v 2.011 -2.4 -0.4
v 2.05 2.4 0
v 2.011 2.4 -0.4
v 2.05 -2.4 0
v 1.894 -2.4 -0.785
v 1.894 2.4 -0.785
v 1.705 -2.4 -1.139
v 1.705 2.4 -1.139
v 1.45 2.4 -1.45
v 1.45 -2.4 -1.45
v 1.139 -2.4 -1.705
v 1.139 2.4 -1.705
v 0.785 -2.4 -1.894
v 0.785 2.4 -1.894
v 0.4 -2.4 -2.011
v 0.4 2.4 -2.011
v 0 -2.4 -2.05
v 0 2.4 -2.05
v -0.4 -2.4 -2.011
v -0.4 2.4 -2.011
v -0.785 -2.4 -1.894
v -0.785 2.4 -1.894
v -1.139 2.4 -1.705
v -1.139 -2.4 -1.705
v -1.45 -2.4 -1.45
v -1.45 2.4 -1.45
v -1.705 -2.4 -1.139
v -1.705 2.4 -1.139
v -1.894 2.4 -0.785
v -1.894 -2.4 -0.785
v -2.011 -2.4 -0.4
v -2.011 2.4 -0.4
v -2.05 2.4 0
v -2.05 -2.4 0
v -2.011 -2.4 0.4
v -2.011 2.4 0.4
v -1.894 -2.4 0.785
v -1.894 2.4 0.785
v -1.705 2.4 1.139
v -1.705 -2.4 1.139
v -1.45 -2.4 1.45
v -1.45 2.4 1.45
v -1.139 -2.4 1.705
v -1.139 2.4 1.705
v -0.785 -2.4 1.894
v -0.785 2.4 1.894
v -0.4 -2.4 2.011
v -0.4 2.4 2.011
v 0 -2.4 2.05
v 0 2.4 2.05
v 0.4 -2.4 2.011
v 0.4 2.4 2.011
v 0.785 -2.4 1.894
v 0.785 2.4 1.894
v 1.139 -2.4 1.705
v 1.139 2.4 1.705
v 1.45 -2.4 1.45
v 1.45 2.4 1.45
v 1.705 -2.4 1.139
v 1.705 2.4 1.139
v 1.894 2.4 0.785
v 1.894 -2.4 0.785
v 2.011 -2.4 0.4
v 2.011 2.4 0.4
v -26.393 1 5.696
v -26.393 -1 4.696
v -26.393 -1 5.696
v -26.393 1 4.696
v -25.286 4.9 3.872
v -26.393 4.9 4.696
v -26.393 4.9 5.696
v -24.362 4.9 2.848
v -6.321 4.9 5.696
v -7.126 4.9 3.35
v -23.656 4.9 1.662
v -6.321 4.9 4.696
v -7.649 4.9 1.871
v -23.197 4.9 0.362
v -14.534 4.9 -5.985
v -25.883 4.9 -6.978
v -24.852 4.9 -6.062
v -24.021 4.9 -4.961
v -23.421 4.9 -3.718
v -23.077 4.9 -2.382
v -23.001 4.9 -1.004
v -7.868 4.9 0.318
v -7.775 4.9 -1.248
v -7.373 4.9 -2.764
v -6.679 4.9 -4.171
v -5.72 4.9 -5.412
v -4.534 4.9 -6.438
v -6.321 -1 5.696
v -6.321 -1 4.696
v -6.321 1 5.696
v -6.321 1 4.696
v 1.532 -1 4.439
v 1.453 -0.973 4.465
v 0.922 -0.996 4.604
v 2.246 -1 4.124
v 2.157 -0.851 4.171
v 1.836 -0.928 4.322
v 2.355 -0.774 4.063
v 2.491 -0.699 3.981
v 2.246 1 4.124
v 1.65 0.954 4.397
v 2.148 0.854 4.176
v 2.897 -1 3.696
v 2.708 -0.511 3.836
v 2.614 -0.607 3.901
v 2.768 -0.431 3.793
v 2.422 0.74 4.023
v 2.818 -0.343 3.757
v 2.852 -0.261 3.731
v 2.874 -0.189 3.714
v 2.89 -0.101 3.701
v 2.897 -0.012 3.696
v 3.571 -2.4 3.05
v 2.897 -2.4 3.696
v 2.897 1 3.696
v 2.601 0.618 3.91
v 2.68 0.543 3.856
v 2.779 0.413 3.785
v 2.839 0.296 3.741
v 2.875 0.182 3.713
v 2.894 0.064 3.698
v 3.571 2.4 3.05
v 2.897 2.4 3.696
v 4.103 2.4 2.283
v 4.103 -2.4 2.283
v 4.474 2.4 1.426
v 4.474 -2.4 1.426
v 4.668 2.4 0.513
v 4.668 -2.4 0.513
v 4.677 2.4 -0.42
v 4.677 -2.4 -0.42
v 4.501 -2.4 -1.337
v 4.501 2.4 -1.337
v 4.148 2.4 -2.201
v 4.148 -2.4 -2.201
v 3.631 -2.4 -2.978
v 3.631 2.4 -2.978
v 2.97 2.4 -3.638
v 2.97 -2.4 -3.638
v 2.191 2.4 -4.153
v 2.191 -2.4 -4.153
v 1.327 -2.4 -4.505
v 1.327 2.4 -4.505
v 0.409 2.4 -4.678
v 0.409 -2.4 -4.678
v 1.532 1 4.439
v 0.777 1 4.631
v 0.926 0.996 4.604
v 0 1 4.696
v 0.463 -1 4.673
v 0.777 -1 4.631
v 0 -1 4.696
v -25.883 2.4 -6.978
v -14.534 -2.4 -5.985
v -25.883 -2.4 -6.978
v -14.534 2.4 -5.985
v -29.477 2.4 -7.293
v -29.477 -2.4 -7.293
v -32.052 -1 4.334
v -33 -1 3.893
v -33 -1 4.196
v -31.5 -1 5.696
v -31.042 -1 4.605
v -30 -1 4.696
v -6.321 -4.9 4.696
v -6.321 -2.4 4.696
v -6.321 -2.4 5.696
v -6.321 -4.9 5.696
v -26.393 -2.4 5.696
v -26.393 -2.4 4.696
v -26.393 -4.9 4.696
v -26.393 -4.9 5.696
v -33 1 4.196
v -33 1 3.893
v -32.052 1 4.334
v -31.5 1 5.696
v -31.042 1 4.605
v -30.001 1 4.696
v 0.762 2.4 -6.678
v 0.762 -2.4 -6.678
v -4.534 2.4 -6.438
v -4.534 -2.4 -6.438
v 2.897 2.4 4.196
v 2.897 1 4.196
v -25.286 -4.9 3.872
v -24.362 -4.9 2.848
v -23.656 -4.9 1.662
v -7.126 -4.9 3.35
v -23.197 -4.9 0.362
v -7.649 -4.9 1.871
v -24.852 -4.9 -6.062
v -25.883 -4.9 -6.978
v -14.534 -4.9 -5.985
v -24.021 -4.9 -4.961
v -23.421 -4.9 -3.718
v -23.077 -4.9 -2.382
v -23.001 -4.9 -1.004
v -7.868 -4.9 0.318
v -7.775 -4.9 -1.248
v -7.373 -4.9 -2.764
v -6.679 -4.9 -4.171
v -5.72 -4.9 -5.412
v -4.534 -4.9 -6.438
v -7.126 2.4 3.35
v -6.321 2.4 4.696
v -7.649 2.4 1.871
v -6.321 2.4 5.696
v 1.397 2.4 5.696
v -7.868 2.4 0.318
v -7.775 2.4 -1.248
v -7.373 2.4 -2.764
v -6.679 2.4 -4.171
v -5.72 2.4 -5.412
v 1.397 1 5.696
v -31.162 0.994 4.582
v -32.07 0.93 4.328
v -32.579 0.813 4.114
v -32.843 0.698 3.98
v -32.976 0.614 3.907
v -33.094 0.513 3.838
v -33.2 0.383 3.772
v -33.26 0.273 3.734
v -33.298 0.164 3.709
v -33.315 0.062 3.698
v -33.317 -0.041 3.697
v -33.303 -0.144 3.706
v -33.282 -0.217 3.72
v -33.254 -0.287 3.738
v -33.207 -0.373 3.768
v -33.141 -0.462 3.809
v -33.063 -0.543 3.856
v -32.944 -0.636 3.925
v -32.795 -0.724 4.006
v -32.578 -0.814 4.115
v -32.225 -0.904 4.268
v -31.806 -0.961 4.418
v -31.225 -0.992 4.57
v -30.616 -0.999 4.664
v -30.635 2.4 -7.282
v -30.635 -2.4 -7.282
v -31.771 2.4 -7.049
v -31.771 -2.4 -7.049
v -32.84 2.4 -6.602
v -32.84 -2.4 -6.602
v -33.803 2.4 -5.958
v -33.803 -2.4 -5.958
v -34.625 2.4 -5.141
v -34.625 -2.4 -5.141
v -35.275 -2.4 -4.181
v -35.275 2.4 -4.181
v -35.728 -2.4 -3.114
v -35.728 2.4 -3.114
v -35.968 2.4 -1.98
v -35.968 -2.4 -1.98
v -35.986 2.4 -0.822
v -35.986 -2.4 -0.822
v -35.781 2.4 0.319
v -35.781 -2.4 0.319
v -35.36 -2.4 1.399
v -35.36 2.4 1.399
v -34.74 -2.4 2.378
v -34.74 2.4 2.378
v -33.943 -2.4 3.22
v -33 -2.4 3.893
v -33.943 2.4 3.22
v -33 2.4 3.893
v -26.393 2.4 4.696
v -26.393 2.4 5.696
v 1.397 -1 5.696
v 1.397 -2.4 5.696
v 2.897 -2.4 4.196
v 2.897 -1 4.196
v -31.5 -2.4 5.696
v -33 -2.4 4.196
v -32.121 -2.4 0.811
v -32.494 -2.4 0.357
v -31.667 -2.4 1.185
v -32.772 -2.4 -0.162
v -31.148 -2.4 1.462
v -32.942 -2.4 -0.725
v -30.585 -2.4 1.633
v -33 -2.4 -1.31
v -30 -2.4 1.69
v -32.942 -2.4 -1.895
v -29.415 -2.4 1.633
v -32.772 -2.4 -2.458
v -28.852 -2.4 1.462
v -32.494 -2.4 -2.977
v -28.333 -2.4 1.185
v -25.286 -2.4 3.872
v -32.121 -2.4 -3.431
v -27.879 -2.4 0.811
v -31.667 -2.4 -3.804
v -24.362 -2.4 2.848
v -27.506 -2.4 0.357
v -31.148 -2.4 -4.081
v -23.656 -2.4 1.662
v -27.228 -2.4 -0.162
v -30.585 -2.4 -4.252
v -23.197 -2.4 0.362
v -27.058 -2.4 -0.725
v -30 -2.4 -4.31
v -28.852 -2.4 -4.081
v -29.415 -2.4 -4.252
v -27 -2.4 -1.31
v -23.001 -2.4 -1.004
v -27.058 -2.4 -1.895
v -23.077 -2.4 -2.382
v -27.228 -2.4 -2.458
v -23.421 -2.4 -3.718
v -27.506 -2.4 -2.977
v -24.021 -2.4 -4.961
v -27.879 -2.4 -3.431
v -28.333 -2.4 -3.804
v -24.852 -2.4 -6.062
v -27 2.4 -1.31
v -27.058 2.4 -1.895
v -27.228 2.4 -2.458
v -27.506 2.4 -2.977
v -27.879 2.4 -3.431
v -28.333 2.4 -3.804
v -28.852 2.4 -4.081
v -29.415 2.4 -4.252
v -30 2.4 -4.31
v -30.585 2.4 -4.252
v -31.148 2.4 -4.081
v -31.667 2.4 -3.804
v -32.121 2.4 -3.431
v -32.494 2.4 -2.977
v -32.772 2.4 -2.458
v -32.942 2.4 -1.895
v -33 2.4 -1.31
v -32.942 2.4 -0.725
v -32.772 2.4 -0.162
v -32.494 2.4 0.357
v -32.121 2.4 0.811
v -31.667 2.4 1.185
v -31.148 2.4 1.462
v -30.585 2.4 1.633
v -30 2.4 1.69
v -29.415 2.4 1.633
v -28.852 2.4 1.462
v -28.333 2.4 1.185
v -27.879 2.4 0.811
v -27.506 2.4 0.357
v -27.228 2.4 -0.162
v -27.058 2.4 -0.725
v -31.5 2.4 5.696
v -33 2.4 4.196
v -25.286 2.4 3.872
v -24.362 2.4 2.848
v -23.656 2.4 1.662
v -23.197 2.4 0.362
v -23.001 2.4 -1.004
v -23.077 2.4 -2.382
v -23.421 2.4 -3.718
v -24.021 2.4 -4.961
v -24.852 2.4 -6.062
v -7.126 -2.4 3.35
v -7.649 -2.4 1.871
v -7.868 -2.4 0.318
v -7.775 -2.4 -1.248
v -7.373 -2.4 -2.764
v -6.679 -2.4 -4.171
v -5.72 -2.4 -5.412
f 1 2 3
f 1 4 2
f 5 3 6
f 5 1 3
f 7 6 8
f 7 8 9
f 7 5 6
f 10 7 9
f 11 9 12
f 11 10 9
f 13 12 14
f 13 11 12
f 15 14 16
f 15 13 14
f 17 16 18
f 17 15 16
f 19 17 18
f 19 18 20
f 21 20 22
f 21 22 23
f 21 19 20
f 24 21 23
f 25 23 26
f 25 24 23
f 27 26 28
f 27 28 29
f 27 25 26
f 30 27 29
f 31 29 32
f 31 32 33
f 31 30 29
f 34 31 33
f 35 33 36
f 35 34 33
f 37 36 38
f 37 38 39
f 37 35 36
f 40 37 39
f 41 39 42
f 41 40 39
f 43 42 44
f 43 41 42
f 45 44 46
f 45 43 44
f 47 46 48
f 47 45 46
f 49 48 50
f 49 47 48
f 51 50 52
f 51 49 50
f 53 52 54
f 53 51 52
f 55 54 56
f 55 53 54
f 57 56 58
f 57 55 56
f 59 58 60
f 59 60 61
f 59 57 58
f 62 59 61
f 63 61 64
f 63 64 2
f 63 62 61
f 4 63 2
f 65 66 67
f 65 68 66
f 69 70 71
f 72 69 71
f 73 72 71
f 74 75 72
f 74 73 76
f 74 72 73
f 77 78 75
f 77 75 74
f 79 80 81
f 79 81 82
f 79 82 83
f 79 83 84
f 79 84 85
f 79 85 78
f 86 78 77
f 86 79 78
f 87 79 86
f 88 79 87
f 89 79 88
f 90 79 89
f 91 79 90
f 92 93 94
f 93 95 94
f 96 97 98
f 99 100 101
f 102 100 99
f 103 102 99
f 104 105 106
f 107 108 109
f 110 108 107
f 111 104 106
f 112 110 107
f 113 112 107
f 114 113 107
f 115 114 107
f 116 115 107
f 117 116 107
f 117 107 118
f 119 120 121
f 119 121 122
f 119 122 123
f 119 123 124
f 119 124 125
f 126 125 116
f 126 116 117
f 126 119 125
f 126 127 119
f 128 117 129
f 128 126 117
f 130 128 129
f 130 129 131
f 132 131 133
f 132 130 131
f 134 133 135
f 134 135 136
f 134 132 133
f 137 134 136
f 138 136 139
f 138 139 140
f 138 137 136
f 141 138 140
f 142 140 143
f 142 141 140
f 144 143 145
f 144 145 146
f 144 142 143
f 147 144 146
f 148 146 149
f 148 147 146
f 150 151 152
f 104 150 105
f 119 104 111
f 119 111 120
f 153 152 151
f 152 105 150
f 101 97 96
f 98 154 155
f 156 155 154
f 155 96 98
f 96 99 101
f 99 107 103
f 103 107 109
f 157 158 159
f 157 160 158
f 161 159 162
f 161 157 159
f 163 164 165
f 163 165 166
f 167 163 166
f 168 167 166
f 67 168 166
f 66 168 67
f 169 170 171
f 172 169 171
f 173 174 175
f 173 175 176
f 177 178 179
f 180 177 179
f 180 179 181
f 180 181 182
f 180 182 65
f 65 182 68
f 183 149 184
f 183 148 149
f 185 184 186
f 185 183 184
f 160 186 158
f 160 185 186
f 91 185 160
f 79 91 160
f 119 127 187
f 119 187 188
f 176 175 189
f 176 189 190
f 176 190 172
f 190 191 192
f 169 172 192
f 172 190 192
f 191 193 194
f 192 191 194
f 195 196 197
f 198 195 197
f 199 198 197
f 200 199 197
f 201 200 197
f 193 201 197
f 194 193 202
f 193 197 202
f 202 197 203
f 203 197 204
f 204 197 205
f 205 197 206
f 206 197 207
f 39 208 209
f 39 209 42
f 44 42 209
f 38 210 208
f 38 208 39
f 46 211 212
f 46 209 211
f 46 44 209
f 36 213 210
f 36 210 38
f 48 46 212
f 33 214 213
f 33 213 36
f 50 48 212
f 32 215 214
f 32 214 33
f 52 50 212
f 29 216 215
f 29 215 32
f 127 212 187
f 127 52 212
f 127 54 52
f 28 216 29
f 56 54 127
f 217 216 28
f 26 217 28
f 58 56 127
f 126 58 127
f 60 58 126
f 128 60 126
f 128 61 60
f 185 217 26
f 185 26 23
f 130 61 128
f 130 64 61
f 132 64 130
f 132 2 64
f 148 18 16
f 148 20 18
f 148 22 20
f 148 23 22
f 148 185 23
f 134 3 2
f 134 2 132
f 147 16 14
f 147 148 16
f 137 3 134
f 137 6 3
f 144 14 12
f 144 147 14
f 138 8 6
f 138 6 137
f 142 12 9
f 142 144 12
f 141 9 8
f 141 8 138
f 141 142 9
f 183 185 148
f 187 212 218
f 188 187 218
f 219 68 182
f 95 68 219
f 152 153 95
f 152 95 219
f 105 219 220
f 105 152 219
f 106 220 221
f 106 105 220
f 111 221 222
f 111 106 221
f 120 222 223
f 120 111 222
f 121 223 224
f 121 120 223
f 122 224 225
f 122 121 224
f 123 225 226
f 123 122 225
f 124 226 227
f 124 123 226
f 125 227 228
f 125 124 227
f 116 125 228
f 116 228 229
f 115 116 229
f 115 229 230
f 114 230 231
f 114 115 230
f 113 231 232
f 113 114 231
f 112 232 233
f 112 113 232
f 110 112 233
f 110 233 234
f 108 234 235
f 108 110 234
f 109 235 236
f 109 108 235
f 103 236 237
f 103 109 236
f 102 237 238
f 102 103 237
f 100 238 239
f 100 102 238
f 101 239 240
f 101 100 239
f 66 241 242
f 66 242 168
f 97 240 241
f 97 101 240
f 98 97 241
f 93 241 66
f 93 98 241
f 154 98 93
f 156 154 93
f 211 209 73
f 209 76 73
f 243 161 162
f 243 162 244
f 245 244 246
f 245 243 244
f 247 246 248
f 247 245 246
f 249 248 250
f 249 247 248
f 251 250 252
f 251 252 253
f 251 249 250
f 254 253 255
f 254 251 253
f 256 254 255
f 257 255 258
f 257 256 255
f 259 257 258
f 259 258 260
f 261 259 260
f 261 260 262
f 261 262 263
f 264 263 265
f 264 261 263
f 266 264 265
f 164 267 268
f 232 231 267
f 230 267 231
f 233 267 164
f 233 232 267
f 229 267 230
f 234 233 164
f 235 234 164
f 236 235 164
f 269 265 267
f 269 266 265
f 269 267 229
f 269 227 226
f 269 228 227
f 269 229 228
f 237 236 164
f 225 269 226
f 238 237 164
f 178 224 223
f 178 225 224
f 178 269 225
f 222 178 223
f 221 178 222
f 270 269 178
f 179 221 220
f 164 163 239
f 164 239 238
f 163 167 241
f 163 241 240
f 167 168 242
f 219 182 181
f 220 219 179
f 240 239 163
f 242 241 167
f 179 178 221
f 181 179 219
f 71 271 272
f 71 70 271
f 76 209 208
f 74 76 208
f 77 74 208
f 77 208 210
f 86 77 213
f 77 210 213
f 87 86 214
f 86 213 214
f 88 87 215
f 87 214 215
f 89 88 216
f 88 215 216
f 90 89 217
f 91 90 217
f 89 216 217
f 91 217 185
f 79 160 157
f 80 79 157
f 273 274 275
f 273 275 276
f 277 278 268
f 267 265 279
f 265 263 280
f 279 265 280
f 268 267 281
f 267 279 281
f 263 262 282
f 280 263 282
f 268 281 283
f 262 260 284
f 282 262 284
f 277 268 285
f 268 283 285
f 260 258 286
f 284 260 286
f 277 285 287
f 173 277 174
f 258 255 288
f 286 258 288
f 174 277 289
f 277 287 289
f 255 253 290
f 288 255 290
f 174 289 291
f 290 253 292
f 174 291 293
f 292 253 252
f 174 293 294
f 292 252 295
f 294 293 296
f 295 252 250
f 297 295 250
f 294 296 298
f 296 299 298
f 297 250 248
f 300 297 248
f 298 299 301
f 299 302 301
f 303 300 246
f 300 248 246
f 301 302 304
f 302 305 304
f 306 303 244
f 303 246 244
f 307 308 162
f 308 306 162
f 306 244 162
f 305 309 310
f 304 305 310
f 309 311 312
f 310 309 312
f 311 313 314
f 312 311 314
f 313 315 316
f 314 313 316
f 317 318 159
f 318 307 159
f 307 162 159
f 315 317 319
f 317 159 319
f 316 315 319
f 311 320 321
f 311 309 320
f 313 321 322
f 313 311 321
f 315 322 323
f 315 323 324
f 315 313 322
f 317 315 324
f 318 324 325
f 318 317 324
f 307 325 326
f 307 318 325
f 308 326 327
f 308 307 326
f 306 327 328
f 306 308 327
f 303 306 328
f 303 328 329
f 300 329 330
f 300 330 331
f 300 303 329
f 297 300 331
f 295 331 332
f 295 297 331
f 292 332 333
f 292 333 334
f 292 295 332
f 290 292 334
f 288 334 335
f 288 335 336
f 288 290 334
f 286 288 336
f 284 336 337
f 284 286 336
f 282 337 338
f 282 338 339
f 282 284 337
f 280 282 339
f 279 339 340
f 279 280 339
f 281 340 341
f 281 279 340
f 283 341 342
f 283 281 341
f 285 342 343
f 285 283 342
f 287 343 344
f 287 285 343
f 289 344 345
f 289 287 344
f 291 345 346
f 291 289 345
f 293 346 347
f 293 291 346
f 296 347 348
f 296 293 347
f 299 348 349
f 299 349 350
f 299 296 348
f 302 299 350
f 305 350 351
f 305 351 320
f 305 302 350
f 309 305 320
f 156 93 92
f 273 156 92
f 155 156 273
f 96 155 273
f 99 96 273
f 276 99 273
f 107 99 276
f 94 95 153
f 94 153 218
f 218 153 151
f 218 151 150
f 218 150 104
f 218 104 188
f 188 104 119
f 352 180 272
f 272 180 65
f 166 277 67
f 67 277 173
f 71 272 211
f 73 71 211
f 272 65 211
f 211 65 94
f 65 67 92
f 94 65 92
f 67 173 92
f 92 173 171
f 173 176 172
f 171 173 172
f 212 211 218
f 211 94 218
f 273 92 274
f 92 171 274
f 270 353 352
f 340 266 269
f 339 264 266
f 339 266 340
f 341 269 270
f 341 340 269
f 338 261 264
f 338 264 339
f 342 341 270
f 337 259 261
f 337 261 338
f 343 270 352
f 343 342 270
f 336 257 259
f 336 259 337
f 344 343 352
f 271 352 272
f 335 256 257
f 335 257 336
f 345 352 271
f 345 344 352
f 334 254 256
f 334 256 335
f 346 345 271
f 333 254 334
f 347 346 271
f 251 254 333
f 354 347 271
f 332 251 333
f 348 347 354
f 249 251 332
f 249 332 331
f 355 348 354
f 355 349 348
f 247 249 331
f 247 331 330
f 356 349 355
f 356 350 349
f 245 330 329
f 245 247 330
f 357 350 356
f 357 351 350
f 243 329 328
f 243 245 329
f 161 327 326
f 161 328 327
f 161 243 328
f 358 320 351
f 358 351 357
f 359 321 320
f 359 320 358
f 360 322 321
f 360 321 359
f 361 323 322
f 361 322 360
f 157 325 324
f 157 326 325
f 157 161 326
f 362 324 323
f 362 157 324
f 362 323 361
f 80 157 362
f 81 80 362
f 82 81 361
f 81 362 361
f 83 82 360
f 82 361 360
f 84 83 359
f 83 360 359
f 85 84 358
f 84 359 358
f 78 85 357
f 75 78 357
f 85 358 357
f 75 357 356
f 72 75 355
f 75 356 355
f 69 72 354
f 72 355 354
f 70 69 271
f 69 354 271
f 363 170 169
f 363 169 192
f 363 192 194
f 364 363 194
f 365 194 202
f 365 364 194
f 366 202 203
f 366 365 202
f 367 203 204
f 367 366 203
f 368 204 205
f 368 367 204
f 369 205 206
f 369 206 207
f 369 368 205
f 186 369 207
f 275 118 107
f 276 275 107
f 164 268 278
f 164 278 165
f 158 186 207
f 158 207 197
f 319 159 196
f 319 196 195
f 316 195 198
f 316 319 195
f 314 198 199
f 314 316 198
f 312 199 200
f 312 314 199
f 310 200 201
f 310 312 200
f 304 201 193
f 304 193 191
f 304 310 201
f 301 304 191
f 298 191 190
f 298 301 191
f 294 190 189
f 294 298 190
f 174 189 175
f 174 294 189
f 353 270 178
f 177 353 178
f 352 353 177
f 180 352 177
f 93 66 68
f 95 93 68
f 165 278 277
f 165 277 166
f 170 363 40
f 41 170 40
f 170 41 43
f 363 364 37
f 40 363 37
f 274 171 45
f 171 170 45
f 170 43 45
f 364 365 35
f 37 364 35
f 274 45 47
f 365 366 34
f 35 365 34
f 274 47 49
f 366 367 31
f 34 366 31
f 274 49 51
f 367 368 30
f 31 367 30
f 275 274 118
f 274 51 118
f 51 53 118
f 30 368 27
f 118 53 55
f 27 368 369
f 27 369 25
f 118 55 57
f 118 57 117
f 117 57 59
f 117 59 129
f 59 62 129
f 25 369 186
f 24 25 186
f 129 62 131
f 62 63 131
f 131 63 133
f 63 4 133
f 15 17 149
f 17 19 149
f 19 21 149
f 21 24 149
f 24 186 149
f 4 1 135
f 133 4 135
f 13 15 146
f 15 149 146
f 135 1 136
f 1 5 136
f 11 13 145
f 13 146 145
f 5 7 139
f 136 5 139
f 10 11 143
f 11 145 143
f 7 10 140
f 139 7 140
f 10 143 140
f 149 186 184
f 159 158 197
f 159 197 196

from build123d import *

# Parameters (mm, degrees)
BOSS_EXTRUDE1_DEPTH             = 2.4
BOSS_EXTRUDE1_DEPTH_BACK        = 2.4
SKETCH2_R                       = 2.05
SKETCH2_R_2                     = 3
BOSS_EXTRUDE3_DEPTH             = 2.5
BOSS_EXTRUDE4_REACH             = 39.46
SKETCH11_W                      = 20.072017009
SKETCH11_H                      = 1
CUT_EXTRUDE1_REACH              = 32.963
CUT_EXTRUDE1_DIRECTION_2_REACH  = 32.963
BOSS_EXTRUDE5_REACH             = 40.271
SKETCH14_W                      = 6.607136291
SKETCH14_H                      = 1.4
BOSS_EXTRUDE5_DIRECTION_2_REACH = 40.271
BOSS_EXTRUDE6_REACH             = 40.271
SKETCH16_W                      = 9.217702834
SKETCH16_H                      = 1.4
BOSS_EXTRUDE6_DIRECTION_2_REACH = 40.271
CHAMFER1_SIZE                   = 1.5
CHAMFER1_OF_MIRROR2_SIZE        = 1.5


with BuildPart() as part:
    # Sketch2 → Boss-Extrude1 (new, two sides: drawn at the far end of the back side and taken through both)
    with BuildSketch(Plane(origin=(0, 0, 0), x_dir=(1, 0, 0), z_dir=(0, 1, 0)).offset(-BOSS_EXTRUDE1_DEPTH_BACK)):
        with BuildLine():
            Line((-30, -4.695887824), (0, -4.695887824))
            ThreePointArc((0, -4.695887824), (4.691418379, -0.20483175), (0.409273591, 4.678018553))
            Line((0.409273591, 4.678018553), (0.761927553, 6.678018553))
            Line((0.761927553, 6.678018553), (-14.53364688, 5.985354694))
            Line((-14.53364688, 5.985354694), (-29.476567352, 7.292690835))
            ThreePointArc((-29.476567352, 7.292690835), (-36, 1.571793945), (-30, -4.695887824))
        make_face()
        Circle(SKETCH2_R, mode=Mode.SUBTRACT)
        with Locations((-30, 1.309828287)):
            Circle(SKETCH2_R_2, mode=Mode.SUBTRACT)
    extrude(amount=BOSS_EXTRUDE1_DEPTH + BOSS_EXTRUDE1_DEPTH_BACK)

    # Sketch10 → Boss-Extrude3 (add)
    with BuildSketch(Plane(origin=(0, 2.4, 0), x_dir=(1, 0, 0), z_dir=(0, 1, 0))):
        with BuildLine():
            ThreePointArc((-25.883157303, 6.978308193), (-23.000951778, 1.004243242), (-26.392863709, -4.695887824))
            Line((-26.392863709, -4.695887824), (-26.392863709, -5.695887824))
            Line((-26.392863709, -5.695887824), (-6.3208467, -5.695887824))
            Line((-6.3208467, -5.695887824), (-6.3208467, -4.695887824))
            ThreePointArc((-6.3208467, -4.695887824), (-7.774768517, 1.247974345), (-4.53364688, 6.438207159))
            Line((-4.53364688, 6.438207159), (-14.53364688, 5.985354694))
            Line((-14.53364688, 5.985354694), (-25.883157303, 6.978308193))
        make_face()
    boss_extrude3 = extrude(amount=BOSS_EXTRUDE3_DEPTH)

    # Mirror1: Boss-Extrude3 across plane
    add(boss_extrude3.mirror(Plane.ZX))

    # Sketch11 → Boss-Extrude4 (add, up to next)
    with BuildSketch(Plane.XZ.offset(-2.4), mode=Mode.PRIVATE) as boss_extrude4_sk1:
        with Locations((-16.356855205, 5.195887824)):
            Rectangle(SKETCH11_W, SKETCH11_H)
    boss_extrude4_tool1 = extrude(boss_extrude4_sk1.sketch, amount=BOSS_EXTRUDE4_REACH, mode=Mode.PRIVATE) - part.part
    add(boss_extrude4_tool1.solids().sort_by_distance((-16.356855, 2.4, 5.195888))[0])

    # Sketch13 → Cut-Extrude1 (cut, up to next)
    with BuildSketch(Plane(origin=(-6.3208467, 0, 0), x_dir=(0, 0, -1), z_dir=(1, 0, 0)), mode=Mode.PRIVATE) as cut_extrude1_sk1:
        with BuildLine():
            Line((-4.695887824, -1), (-4.695887824, 1))
            ThreePointArc((-4.695887824, 1), (-3.695887824, 0), (-4.695887824, -1))
        make_face()
    cut_extrude1_tool1 = extrude(cut_extrude1_sk1.sketch, amount=-CUT_EXTRUDE1_REACH, mode=Mode.PRIVATE) & part.part
    add(cut_extrude1_tool1.solids().sort_by_distance((-6.320847, 0, 4.271475))[0], mode=Mode.SUBTRACT)

    # Sketch13 → Cut-Extrude1 direction 2 (cut, up to next)
    with BuildSketch(Plane(origin=(-6.3208467, 0, 0), x_dir=(0, 0, -1), z_dir=(1, 0, 0)), mode=Mode.PRIVATE) as cut_extrude1_direction_2_sk1:
        with BuildLine():
            Line((-4.695887824, -1), (-4.695887824, 1))
            ThreePointArc((-4.695887824, 1), (-3.695887824, 0), (-4.695887824, -1))
        make_face()
    cut_extrude1_direction_2_tool1 = extrude(cut_extrude1_direction_2_sk1.sketch, amount=CUT_EXTRUDE1_DIRECTION_2_REACH, mode=Mode.PRIVATE) & part.part
    add(cut_extrude1_direction_2_tool1.solids().sort_by_distance((-6.320847, 0, 4.271475))[0], mode=Mode.SUBTRACT)

    # Boss-Extrude5: up to this face of the body (flat: up to its plane)
    boss_extrude5_end = Plane(part.part.faces().sort_by_distance((-16.356855205, 0, 5.695887824))[0])
    # Sketch14 → Boss-Extrude5 (add, up to the picked face)
    with BuildSketch(Plane.XY.offset(4.695887824), mode=Mode.PRIVATE) as boss_extrude5_sk1:
        with Locations((-29.696431854, -1.7)):
            Rectangle(SKETCH14_W, SKETCH14_H)
    boss_extrude5_tool1 = split(extrude(boss_extrude5_sk1.sketch, amount=BOSS_EXTRUDE5_REACH, mode=Mode.PRIVATE), bisect_by=boss_extrude5_end, keep=Keep.BOTH, mode=Mode.PRIVATE)
    boss_extrude5 = boss_extrude5_tool1.solids().sort_by(Axis((-29.696432, -1.7, 4.695888), (0, 0, 1)))[0]
    add(boss_extrude5)

    # Sketch14 → Boss-Extrude5 direction 2 (add, up to next)
    with BuildSketch(Plane.XY.offset(4.695887824), mode=Mode.PRIVATE) as boss_extrude5_direction_2_sk1:
        with Locations((-29.696431854, -1.7)):
            Rectangle(SKETCH14_W, SKETCH14_H)
    boss_extrude5_direction_2_tool1 = extrude(boss_extrude5_direction_2_sk1.sketch, amount=-BOSS_EXTRUDE5_DIRECTION_2_REACH, mode=Mode.PRIVATE) - part.part
    boss_extrude5_direction_2 = boss_extrude5_direction_2_tool1.solids().sort_by_distance((-29.696432, -1.7, 4.695888))[0]
    add(boss_extrude5_direction_2)

    # Boss-Extrude6: up to this face of the body (flat: up to its plane)
    boss_extrude6_end = Plane(part.part.faces().sort_by_distance((-16.955969125, -0.076351274, 5.695887824))[0])
    # Sketch16 → Boss-Extrude6 (add, up to the picked face)
    with BuildSketch(Plane.XY.offset(4.695887824), mode=Mode.PRIVATE) as boss_extrude6_sk1:
        with Locations((-1.711995283, -1.7)):
            Rectangle(SKETCH16_W, SKETCH16_H)
    boss_extrude6_tool1 = split(extrude(boss_extrude6_sk1.sketch, amount=BOSS_EXTRUDE6_REACH, mode=Mode.PRIVATE), bisect_by=boss_extrude6_end, keep=Keep.BOTH, mode=Mode.PRIVATE)
    boss_extrude6 = boss_extrude6_tool1.solids().sort_by(Axis((-1.711995, -1.7, 4.695888), (0, 0, 1)))[0]
    add(boss_extrude6)

    # Sketch16 → Boss-Extrude6 direction 2 (add, up to next)
    with BuildSketch(Plane.XY.offset(4.695887824), mode=Mode.PRIVATE) as boss_extrude6_direction_2_sk1:
        with Locations((-1.711995283, -1.7)):
            Rectangle(SKETCH16_W, SKETCH16_H)
    boss_extrude6_direction_2_tool1 = extrude(boss_extrude6_direction_2_sk1.sketch, amount=-BOSS_EXTRUDE6_DIRECTION_2_REACH, mode=Mode.PRIVATE) - part.part
    boss_extrude6_direction_2 = boss_extrude6_direction_2_tool1.solids().sort_by_distance((-1.711995, -1.7, 4.695888))[0]
    add(boss_extrude6_direction_2)

    # Chamfer1
    chamfer1_edges = [part.edges().sort_by_distance(p)[0] for p in [
        (-33, -1.7, 5.695887824),
        (2.896856134, -1.7, 5.695887824),
    ]]
    chamfer(chamfer1_edges, length=CHAMFER1_SIZE)

    # Mirror2: Boss-Extrude5, Boss-Extrude5 direction 2, Boss-Extrude6, Boss-Extrude6 direction 2 across plane
    add(boss_extrude5.mirror(Plane.ZX))
    add(boss_extrude5_direction_2.mirror(Plane.ZX))
    add(boss_extrude6.mirror(Plane.ZX))
    add(boss_extrude6_direction_2.mirror(Plane.ZX))

    # Chamfer1 of Mirror2
    chamfer1_of_mirror2_edges = [part.edges().sort_by_distance(p)[0] for p in [
        (-33, 1.7, 5.695887824),
        (2.896856134, 1.7, 5.695887824),
    ]]
    chamfer(chamfer1_of_mirror2_edges, length=CHAMFER1_OF_MIRROR2_SIZE)


solid = part.part
